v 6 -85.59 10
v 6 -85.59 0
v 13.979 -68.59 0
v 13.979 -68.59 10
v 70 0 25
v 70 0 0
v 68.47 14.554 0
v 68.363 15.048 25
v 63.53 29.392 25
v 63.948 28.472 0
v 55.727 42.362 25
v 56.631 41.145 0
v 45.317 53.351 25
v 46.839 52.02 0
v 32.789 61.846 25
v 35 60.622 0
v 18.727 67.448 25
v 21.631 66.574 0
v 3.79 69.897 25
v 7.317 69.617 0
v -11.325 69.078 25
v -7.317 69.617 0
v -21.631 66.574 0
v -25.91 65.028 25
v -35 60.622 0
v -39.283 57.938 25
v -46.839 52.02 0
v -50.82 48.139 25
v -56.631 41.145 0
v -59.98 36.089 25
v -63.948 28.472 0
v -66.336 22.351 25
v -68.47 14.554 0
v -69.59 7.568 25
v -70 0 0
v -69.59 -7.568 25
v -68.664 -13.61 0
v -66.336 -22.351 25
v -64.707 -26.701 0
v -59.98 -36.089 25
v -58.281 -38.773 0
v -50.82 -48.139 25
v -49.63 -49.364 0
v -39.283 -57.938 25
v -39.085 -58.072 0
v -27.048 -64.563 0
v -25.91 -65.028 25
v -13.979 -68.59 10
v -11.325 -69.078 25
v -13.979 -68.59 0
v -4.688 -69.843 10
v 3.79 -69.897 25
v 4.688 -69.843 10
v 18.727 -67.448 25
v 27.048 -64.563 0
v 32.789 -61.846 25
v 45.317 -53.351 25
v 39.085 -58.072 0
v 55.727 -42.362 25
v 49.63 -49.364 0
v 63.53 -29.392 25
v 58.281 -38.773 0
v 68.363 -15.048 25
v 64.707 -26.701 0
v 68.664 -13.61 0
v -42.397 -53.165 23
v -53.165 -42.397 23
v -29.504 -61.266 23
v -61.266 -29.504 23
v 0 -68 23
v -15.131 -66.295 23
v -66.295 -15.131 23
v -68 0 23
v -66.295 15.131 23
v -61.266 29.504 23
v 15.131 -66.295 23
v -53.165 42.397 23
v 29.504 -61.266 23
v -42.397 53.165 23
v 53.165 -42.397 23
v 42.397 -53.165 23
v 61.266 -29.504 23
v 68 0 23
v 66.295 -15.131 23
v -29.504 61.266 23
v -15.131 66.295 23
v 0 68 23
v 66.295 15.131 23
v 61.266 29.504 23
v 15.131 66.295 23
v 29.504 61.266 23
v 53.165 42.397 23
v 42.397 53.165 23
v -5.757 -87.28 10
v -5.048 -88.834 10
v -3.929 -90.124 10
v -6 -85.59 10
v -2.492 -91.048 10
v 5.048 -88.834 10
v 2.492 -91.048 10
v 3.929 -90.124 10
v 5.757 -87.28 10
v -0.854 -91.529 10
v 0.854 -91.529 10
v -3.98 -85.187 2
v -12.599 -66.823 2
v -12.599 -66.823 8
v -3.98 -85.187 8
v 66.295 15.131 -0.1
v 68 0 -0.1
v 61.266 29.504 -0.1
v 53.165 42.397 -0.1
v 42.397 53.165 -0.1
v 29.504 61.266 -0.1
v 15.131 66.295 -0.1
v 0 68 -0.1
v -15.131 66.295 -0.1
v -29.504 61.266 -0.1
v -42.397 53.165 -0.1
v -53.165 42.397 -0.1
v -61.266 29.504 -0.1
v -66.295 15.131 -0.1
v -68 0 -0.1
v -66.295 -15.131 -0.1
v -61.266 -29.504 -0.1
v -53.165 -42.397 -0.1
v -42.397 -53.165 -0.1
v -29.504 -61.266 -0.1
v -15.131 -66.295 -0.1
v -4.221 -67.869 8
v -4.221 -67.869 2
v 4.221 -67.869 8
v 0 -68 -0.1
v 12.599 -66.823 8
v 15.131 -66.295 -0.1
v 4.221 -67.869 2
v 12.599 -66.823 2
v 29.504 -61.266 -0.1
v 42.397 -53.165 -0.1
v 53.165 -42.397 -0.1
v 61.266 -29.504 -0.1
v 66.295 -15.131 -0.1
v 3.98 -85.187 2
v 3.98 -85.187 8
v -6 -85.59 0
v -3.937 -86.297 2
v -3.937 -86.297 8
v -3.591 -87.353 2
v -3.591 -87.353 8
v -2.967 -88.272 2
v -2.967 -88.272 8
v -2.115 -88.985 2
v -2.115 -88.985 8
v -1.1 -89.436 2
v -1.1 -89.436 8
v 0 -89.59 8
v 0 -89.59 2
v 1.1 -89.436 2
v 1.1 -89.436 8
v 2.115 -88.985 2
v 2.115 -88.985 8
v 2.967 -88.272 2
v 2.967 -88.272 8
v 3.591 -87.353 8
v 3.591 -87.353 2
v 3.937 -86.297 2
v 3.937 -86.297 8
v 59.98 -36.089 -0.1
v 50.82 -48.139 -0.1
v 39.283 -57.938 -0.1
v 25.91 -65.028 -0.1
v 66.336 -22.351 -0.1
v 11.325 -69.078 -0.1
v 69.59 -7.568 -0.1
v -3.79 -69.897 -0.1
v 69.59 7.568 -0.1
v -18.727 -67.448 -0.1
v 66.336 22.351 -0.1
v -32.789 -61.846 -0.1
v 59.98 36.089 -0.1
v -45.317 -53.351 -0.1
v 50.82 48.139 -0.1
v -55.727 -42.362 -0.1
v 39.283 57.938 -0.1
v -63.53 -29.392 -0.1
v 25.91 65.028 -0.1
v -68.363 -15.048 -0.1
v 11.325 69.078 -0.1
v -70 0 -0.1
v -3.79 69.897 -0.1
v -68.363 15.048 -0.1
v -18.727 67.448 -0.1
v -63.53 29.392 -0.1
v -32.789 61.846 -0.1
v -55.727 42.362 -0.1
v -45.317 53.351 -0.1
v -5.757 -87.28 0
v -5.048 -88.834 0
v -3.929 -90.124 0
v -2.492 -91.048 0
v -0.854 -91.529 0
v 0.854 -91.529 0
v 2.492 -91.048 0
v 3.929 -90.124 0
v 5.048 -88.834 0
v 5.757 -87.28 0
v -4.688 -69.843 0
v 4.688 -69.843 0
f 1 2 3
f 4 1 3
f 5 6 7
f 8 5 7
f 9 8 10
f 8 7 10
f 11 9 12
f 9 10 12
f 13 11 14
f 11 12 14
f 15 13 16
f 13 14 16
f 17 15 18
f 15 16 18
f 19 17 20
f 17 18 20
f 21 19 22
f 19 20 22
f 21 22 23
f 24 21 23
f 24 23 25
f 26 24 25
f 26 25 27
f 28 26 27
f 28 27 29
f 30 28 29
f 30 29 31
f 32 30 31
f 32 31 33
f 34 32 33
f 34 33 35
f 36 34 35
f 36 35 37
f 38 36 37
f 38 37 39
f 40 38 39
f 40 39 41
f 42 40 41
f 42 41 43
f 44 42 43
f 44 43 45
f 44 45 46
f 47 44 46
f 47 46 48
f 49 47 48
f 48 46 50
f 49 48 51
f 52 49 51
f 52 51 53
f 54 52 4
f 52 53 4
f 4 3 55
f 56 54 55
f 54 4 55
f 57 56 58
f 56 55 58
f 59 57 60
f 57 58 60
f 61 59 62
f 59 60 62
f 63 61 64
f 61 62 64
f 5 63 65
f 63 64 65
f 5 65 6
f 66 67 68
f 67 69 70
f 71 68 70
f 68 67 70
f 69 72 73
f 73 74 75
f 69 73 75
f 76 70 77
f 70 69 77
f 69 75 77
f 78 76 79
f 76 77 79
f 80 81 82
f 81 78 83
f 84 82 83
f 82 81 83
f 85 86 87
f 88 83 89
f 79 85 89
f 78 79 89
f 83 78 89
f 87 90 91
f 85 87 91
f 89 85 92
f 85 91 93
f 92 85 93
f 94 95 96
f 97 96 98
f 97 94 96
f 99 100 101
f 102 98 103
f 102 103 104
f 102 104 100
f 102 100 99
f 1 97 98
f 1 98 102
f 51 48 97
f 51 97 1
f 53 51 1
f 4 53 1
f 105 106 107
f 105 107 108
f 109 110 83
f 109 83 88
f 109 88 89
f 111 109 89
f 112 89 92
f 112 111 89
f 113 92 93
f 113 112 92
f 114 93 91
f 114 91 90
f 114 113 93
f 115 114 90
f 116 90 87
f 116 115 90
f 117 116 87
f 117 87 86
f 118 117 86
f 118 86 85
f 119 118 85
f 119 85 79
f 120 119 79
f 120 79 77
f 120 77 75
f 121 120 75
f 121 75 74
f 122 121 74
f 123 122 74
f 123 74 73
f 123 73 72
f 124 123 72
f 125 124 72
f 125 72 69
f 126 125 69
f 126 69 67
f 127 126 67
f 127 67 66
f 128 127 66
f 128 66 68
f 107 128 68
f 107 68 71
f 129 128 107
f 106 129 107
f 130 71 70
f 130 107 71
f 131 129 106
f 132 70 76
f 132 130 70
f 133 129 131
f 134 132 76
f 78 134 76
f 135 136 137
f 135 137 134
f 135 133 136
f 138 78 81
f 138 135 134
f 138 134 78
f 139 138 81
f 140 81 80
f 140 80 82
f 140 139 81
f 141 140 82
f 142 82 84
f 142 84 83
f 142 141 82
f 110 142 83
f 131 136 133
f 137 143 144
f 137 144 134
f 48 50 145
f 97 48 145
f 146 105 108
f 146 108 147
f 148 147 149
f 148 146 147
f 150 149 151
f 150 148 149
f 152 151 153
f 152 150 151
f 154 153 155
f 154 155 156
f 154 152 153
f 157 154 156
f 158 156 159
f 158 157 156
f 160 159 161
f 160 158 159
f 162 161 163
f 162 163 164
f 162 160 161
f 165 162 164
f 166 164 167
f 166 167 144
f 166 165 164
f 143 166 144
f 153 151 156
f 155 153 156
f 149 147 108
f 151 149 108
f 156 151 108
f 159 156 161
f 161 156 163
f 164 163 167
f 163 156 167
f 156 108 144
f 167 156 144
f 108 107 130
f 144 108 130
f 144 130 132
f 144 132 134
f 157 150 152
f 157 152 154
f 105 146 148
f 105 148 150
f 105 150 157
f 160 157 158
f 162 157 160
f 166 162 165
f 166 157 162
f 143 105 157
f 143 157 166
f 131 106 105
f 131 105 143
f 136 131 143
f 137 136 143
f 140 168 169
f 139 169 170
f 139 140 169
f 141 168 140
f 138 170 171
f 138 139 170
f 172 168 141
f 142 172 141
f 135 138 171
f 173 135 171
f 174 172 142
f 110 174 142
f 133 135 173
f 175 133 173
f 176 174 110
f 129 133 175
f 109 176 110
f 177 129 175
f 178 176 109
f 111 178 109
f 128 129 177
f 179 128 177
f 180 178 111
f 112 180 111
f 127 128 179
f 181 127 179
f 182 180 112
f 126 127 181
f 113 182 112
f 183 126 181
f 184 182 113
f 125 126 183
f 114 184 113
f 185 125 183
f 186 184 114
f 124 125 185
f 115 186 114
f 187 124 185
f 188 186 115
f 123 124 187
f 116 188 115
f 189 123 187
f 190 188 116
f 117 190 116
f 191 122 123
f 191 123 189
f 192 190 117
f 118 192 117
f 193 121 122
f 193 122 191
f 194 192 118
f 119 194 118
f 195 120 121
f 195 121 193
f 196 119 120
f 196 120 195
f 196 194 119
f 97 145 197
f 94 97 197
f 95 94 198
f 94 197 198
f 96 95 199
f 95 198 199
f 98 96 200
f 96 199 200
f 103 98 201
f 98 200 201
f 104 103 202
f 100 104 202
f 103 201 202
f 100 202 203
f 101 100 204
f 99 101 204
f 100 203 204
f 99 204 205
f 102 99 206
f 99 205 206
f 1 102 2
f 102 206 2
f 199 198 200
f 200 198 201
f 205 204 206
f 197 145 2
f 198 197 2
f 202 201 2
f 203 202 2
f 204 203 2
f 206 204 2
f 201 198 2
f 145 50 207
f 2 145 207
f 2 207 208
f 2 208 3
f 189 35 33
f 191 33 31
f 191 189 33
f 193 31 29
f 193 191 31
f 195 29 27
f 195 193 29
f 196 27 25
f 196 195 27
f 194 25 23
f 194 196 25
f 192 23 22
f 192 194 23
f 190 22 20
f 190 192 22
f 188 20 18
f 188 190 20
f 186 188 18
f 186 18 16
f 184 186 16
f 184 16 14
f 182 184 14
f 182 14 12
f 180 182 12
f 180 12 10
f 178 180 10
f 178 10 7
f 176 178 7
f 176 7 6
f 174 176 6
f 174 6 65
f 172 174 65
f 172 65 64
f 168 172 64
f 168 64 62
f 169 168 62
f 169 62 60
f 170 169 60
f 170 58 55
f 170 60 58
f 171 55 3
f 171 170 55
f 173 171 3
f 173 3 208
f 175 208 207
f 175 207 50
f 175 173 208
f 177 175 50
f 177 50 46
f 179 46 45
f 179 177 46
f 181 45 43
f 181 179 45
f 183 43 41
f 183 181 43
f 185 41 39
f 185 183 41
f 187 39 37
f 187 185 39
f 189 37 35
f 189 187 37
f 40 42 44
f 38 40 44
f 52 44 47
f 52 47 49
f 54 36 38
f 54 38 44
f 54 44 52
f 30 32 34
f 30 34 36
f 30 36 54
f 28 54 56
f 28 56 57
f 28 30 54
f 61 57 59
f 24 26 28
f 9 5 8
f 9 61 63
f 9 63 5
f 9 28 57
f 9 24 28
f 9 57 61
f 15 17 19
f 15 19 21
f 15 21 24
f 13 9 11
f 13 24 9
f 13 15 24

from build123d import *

# Parameters (mm, degrees)
SKETCH1_R           = 70
BOSS_EXTRUDE1_DEPTH = 25
BOSS_EXTRUDE2_DEPTH = 10
BOSS_EXTRUDE3_START = 0.1
SKETCH27_R          = 70
BOSS_EXTRUDE3_DEPTH = 0.1
SHELL3_START        = -0.1
SHELL3_OUTLINE_R    = 68
SHELL3_DEPTH        = 23.1
SHELL3_START_2      = 2
SHELL3_2_DEPTH      = 6


# Read off the part's stored shape, not the designer's step: Shell3
with BuildPart() as part:
    # Sketch1 → Boss-Extrude1 (new body)
    with BuildSketch(Plane.XY):
        Circle(SKETCH1_R)
    extrude(amount=BOSS_EXTRUDE1_DEPTH)

    # Sketch21 → Boss-Extrude2 (add)
    with BuildSketch(Plane.XY):
        with BuildLine():
            Line((-13.97898065, -68.59), (-6, -85.59))
            ThreePointArc((-6, -85.59), (0, -91.59), (6, -85.59))
            Line((6, -85.59), (13.97898065, -68.59))
            ThreePointArc((13.97898065, -68.59), (0, -70), (-13.97898065, -68.59))
        make_face()
    extrude(amount=BOSS_EXTRUDE2_DEPTH)

    # Sketch27 → Boss-Extrude3 (add)
    with BuildSketch(Plane(origin=(0, 0, 0), x_dir=(-1, 0, 0), z_dir=(0, 0, -1)).offset(BOSS_EXTRUDE3_START)):
        Circle(SKETCH27_R)
    extrude(amount=-BOSS_EXTRUDE3_DEPTH)

    # Shell3 outline → Shell3 (cut)
    with BuildSketch(Plane.XY.offset(SHELL3_START)):
        Circle(SHELL3_OUTLINE_R)
    extrude(amount=SHELL3_DEPTH, mode=Mode.SUBTRACT)

    # Shell3 2 outline → Shell3 2 (cut)
    with BuildSketch(Plane.XY.offset(SHELL3_START_2)):
        with BuildLine():
            ThreePointArc((12.599173957, -66.82260707), (0, -68), (-12.599173957, -66.82260707))
            Line((-12.599173957, -66.82260707), (-3.979676533, -85.187290811))
            ThreePointArc((-3.979676533, -85.187290811), (0, -89.59), (3.979676533, -85.187290811))
            Line((3.979676533, -85.187290811), (12.599173957, -66.82260707))
        make_face()
    extrude(amount=SHELL3_2_DEPTH, mode=Mode.SUBTRACT)


solid = part.part
